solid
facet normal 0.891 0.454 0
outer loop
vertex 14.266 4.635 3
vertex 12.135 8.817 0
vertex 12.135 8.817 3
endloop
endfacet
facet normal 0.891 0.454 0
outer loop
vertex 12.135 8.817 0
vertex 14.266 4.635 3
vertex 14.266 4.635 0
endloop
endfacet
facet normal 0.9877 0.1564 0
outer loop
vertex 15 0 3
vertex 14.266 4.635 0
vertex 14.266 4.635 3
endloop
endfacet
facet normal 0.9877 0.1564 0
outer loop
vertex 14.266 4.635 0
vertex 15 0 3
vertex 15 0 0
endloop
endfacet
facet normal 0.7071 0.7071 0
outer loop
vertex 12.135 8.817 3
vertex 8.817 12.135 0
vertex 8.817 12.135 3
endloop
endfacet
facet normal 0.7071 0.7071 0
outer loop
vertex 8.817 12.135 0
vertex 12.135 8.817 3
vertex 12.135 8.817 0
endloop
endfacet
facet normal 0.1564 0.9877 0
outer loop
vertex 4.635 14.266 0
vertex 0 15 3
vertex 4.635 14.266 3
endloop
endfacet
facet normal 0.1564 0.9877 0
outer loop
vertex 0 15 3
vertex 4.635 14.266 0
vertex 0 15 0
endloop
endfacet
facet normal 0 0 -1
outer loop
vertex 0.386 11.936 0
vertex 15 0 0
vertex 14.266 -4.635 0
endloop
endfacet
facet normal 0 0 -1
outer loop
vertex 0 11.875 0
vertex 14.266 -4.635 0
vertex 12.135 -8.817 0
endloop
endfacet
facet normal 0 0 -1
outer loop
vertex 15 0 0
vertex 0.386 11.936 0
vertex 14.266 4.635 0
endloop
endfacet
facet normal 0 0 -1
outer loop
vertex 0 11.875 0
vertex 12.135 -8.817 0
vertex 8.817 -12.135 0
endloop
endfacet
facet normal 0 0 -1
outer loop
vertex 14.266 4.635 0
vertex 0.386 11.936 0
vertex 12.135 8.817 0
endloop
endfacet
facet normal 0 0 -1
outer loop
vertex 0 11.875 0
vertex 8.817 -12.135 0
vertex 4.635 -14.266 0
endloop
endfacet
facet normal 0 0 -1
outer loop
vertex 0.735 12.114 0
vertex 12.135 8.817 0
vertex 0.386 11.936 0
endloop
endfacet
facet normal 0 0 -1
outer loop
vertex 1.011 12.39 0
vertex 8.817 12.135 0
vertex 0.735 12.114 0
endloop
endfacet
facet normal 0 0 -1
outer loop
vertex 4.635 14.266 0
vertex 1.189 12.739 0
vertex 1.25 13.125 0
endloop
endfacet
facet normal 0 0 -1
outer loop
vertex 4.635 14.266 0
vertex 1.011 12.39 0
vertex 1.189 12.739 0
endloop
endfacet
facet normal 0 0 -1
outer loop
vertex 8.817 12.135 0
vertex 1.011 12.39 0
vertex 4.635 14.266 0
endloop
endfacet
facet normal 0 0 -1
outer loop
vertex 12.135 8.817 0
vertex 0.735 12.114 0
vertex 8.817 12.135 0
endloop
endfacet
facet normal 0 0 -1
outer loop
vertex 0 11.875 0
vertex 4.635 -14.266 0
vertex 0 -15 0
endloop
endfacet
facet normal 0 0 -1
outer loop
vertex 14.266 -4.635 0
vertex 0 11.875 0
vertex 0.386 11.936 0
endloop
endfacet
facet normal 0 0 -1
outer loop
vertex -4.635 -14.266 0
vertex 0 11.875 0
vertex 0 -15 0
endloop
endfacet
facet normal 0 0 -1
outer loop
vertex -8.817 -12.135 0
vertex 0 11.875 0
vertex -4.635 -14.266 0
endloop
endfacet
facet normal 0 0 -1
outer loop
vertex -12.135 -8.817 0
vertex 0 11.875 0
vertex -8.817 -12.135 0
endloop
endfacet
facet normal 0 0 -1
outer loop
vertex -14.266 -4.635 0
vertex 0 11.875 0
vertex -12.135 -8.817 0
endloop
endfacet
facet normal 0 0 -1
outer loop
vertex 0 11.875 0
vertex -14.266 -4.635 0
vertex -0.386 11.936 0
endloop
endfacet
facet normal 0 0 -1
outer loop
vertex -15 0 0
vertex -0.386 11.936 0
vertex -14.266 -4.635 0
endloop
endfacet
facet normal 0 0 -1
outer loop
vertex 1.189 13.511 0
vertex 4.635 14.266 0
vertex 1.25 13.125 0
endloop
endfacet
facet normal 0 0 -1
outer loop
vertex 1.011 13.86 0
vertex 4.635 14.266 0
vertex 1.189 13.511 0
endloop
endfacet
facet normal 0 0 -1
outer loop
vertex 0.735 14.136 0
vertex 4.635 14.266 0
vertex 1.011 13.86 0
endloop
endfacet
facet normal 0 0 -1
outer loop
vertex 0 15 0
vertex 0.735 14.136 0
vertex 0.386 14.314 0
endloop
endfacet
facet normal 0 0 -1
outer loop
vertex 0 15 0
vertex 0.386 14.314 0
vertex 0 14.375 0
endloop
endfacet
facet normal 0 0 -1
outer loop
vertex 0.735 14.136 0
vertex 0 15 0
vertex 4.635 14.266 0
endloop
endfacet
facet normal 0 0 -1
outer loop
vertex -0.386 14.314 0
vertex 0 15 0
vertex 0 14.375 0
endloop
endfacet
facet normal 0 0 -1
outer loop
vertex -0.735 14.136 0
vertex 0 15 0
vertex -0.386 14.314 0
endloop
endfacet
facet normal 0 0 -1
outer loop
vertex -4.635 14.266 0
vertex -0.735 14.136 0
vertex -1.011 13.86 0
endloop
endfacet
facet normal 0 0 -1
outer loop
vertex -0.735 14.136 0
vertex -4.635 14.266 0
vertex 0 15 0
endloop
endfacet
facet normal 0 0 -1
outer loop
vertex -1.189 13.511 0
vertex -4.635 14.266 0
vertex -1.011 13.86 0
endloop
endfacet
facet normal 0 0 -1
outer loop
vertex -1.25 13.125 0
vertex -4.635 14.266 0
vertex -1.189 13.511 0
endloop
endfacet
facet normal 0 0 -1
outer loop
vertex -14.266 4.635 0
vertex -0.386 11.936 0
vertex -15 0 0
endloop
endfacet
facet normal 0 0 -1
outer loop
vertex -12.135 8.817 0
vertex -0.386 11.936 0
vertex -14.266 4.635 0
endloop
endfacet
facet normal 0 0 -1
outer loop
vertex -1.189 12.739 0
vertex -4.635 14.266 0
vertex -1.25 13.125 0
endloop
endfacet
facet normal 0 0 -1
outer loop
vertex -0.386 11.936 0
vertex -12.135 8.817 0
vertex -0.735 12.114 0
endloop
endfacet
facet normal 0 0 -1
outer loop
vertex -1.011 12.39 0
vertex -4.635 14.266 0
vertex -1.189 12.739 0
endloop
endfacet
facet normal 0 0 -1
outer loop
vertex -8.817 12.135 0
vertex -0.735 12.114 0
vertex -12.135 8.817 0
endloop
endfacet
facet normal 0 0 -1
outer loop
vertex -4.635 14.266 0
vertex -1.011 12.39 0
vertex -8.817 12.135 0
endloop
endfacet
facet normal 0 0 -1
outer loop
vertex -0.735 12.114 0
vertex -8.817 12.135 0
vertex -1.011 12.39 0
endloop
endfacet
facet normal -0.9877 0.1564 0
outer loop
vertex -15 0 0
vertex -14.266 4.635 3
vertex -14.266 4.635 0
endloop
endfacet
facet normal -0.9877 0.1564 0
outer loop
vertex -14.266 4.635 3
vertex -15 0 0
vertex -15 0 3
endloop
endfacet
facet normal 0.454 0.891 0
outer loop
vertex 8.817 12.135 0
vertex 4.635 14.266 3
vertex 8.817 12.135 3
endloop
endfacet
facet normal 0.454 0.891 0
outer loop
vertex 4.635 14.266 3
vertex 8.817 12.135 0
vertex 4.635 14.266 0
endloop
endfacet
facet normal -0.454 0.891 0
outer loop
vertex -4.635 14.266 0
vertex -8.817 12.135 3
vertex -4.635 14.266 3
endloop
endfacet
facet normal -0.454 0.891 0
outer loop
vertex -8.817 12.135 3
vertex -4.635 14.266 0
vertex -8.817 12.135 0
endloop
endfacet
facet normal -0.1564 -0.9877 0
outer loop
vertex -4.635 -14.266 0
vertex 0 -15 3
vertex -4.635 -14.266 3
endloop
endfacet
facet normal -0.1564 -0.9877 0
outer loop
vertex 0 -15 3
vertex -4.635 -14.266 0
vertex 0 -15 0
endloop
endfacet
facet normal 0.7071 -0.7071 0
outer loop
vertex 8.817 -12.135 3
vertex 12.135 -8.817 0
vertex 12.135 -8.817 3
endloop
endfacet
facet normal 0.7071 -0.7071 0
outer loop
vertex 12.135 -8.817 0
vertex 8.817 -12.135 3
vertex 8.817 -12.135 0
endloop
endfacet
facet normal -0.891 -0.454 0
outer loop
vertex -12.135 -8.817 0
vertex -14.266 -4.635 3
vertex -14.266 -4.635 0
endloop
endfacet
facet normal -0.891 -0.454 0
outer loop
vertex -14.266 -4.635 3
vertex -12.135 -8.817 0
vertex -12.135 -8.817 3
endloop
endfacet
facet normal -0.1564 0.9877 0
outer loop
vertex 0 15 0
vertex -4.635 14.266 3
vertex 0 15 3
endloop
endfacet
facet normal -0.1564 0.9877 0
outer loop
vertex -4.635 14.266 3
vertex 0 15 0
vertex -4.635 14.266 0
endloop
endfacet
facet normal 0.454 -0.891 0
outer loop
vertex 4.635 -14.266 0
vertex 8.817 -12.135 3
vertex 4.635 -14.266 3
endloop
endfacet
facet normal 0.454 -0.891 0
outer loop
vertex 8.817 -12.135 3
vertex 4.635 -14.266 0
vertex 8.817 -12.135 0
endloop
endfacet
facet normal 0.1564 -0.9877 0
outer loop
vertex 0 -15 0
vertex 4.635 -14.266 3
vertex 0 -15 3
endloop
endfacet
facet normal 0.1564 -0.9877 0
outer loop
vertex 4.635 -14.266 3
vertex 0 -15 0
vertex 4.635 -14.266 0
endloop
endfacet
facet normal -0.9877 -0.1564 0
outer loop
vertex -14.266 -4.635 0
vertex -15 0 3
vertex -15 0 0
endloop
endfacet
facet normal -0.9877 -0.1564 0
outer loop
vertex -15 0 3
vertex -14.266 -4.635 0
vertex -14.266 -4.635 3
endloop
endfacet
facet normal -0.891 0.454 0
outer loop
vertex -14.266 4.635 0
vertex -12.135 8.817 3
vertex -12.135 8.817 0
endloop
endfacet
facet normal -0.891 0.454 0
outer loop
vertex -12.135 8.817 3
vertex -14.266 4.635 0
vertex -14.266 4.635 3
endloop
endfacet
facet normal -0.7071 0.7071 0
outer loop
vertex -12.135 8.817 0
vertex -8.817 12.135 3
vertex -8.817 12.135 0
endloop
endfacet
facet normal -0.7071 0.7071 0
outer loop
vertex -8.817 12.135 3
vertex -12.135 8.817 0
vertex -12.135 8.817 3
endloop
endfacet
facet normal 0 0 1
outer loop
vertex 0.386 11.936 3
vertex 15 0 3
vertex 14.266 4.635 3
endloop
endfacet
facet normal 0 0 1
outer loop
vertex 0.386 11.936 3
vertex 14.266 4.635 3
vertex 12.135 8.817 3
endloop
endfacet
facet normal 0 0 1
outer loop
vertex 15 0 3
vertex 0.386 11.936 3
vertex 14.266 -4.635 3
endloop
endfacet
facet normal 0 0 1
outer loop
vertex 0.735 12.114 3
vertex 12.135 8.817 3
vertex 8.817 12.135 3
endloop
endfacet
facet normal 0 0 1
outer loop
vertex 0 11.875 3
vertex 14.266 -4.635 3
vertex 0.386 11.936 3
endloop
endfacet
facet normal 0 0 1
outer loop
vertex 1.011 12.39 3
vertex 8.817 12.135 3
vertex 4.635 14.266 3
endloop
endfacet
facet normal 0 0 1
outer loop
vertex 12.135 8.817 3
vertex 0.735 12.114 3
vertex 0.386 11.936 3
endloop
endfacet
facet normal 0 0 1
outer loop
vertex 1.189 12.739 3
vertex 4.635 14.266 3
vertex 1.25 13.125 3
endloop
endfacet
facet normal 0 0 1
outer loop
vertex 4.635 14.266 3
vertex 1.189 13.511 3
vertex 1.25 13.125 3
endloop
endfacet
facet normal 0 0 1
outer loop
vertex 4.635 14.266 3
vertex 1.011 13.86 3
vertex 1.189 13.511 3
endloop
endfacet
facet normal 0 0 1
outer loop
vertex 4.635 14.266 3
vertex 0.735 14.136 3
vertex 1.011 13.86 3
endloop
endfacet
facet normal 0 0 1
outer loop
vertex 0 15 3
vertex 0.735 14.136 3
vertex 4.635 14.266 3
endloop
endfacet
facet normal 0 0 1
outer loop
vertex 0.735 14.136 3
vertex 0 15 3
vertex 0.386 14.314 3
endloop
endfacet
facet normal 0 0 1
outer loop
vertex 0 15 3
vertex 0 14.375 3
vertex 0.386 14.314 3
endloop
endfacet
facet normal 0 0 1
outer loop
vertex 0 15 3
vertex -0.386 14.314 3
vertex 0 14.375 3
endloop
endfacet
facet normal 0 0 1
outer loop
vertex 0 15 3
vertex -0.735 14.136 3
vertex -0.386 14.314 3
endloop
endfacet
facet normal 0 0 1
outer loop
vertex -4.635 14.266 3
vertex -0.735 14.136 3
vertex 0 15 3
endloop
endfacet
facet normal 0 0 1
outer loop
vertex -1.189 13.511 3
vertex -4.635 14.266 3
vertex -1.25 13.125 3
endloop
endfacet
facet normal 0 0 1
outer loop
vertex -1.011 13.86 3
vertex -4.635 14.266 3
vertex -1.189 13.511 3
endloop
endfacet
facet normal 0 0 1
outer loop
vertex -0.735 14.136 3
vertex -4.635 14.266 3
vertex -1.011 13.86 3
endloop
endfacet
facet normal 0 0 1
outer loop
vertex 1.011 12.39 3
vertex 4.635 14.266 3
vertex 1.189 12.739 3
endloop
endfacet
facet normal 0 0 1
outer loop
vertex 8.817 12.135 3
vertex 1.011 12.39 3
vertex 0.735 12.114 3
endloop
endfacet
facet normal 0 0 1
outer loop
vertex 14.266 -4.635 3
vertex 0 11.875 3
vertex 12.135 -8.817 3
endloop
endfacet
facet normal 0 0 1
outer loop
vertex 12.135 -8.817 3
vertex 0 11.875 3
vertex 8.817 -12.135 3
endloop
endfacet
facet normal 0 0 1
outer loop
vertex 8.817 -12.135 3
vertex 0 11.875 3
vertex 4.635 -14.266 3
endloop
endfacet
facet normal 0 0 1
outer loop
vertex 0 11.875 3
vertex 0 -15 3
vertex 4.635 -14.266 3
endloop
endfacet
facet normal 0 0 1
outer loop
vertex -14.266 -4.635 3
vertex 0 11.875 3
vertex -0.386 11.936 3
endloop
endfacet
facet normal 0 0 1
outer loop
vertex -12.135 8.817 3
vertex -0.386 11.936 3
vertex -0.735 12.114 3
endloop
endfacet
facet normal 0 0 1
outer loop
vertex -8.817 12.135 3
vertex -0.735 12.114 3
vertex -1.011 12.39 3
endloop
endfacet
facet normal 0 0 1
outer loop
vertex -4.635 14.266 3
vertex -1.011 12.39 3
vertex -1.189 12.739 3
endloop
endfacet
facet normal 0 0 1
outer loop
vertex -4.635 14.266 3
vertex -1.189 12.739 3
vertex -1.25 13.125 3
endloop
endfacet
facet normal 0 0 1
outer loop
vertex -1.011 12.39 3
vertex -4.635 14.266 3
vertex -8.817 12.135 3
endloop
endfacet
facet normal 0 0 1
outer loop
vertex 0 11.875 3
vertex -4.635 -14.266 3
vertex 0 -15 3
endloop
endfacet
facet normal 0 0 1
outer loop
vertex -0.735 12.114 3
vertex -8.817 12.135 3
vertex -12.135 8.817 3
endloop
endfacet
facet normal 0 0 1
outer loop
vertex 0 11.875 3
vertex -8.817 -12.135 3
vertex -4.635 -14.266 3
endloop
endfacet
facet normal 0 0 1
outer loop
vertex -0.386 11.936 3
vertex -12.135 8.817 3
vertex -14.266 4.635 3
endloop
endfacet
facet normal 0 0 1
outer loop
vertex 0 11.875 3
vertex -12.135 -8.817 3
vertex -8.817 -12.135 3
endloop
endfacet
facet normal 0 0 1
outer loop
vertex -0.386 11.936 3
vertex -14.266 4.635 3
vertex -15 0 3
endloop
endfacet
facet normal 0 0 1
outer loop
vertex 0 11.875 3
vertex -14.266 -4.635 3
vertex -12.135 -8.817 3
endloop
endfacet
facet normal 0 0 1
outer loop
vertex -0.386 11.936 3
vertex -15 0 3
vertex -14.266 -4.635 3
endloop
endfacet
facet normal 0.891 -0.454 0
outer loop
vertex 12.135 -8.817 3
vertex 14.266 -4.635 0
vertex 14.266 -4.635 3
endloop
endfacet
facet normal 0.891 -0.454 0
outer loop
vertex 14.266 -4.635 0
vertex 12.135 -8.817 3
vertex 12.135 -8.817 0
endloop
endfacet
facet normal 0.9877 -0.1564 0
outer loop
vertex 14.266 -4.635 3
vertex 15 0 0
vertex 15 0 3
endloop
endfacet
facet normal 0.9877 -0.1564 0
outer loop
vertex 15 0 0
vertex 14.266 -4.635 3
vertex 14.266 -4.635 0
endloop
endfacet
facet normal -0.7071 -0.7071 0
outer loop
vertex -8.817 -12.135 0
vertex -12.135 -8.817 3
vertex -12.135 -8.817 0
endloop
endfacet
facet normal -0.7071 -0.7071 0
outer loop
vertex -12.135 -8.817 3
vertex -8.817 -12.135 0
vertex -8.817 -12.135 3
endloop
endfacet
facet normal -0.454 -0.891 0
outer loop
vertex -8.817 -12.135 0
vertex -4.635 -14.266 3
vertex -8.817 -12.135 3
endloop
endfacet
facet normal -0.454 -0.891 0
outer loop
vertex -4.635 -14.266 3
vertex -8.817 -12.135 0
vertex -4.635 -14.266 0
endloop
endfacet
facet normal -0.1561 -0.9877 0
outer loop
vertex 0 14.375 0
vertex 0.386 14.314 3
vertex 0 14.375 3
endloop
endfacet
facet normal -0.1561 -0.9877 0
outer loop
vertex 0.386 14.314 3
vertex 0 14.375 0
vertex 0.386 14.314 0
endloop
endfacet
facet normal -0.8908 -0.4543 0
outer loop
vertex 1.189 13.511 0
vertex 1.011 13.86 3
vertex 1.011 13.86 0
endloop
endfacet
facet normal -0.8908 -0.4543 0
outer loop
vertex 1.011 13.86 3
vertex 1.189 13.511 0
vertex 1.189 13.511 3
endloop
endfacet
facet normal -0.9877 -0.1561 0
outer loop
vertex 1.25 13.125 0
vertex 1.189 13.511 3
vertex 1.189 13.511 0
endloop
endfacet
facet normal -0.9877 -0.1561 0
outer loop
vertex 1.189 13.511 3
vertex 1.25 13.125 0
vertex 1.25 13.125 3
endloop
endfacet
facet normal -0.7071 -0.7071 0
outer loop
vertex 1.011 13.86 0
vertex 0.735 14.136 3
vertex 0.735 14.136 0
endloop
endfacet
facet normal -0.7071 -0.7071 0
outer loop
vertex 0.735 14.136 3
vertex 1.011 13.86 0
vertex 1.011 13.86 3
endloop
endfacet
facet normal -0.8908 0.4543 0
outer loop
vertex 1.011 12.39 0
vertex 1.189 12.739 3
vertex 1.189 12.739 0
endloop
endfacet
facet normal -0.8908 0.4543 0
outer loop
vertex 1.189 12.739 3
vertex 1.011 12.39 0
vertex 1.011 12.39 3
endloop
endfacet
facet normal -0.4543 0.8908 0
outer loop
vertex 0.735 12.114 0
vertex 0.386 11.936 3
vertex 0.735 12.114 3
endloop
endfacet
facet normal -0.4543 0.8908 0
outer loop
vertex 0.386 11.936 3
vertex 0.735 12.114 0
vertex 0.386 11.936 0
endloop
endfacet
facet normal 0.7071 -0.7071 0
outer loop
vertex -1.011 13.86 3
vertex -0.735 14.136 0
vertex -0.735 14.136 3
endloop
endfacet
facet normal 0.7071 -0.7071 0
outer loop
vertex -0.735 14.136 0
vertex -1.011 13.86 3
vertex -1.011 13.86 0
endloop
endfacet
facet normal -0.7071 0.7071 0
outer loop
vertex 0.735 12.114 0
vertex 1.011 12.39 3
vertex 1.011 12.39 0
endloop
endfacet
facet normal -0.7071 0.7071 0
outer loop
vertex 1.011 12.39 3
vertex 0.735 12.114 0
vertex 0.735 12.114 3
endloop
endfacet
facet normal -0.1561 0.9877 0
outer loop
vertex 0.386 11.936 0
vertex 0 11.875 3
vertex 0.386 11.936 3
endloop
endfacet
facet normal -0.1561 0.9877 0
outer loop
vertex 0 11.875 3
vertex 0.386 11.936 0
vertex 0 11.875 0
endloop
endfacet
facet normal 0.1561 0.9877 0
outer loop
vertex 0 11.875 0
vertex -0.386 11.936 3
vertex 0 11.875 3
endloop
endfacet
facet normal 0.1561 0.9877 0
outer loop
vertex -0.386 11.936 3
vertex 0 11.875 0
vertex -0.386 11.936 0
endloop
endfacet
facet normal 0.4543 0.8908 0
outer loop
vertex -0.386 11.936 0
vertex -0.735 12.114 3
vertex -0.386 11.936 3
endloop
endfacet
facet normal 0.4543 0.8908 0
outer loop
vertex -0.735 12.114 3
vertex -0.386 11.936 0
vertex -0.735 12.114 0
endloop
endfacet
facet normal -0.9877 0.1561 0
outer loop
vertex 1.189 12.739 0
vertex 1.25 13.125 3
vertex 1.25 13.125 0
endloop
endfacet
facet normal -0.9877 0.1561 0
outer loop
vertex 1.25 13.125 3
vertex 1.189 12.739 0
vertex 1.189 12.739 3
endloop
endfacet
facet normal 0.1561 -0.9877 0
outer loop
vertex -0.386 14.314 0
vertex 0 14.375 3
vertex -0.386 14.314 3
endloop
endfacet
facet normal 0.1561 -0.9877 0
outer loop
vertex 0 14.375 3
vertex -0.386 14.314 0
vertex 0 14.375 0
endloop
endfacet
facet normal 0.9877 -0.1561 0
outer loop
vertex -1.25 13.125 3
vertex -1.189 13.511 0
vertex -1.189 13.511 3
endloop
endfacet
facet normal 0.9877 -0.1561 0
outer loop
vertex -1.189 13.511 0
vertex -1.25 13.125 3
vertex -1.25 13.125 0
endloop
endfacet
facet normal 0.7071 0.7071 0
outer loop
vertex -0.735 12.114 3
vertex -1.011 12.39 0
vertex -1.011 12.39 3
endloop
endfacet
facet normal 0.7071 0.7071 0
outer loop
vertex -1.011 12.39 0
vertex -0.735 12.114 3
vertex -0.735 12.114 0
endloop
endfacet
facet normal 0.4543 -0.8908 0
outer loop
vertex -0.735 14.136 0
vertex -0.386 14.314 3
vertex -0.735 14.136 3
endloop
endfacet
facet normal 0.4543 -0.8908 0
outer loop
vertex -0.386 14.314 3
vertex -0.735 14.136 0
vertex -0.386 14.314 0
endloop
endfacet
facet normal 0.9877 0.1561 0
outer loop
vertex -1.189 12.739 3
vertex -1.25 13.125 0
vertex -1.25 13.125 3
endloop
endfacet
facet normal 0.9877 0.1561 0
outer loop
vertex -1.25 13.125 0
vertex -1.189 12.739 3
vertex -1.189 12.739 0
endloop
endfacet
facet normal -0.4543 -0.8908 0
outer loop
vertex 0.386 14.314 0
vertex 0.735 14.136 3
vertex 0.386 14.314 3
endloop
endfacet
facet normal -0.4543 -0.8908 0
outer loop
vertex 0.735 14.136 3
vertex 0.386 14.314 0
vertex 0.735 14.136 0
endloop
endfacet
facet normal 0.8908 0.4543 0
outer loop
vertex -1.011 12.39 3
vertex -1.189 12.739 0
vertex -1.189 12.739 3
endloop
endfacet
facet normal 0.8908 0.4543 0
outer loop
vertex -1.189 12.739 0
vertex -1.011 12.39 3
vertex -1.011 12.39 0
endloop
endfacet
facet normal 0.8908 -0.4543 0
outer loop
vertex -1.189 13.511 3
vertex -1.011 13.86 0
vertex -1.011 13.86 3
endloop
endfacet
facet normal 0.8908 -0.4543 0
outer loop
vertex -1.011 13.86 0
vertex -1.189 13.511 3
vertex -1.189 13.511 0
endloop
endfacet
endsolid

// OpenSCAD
// coin dimensions
roundness=20;
coinHeight=3;
coinRadius=15;

// coin image
coinImage="SafeCoin.png";
imageSize=coinRadius*1.5;
imageHeight=coinHeight*1.5;

// pendant option
isPendant=true;

difference(){
    difference(){
        cylinder(h=coinHeight, r=coinRadius, center=false, $fn=roundness);
        resize([imageSize,imageSize,imageHeight])
            surface(file=coinImage, center=true, invert=false);
    }
    if(isPendant){
        translate([0,coinRadius*.875,0])
            cylinder(h=coinHeight, r=1.25, center=false, $fn=20);
    }
}
